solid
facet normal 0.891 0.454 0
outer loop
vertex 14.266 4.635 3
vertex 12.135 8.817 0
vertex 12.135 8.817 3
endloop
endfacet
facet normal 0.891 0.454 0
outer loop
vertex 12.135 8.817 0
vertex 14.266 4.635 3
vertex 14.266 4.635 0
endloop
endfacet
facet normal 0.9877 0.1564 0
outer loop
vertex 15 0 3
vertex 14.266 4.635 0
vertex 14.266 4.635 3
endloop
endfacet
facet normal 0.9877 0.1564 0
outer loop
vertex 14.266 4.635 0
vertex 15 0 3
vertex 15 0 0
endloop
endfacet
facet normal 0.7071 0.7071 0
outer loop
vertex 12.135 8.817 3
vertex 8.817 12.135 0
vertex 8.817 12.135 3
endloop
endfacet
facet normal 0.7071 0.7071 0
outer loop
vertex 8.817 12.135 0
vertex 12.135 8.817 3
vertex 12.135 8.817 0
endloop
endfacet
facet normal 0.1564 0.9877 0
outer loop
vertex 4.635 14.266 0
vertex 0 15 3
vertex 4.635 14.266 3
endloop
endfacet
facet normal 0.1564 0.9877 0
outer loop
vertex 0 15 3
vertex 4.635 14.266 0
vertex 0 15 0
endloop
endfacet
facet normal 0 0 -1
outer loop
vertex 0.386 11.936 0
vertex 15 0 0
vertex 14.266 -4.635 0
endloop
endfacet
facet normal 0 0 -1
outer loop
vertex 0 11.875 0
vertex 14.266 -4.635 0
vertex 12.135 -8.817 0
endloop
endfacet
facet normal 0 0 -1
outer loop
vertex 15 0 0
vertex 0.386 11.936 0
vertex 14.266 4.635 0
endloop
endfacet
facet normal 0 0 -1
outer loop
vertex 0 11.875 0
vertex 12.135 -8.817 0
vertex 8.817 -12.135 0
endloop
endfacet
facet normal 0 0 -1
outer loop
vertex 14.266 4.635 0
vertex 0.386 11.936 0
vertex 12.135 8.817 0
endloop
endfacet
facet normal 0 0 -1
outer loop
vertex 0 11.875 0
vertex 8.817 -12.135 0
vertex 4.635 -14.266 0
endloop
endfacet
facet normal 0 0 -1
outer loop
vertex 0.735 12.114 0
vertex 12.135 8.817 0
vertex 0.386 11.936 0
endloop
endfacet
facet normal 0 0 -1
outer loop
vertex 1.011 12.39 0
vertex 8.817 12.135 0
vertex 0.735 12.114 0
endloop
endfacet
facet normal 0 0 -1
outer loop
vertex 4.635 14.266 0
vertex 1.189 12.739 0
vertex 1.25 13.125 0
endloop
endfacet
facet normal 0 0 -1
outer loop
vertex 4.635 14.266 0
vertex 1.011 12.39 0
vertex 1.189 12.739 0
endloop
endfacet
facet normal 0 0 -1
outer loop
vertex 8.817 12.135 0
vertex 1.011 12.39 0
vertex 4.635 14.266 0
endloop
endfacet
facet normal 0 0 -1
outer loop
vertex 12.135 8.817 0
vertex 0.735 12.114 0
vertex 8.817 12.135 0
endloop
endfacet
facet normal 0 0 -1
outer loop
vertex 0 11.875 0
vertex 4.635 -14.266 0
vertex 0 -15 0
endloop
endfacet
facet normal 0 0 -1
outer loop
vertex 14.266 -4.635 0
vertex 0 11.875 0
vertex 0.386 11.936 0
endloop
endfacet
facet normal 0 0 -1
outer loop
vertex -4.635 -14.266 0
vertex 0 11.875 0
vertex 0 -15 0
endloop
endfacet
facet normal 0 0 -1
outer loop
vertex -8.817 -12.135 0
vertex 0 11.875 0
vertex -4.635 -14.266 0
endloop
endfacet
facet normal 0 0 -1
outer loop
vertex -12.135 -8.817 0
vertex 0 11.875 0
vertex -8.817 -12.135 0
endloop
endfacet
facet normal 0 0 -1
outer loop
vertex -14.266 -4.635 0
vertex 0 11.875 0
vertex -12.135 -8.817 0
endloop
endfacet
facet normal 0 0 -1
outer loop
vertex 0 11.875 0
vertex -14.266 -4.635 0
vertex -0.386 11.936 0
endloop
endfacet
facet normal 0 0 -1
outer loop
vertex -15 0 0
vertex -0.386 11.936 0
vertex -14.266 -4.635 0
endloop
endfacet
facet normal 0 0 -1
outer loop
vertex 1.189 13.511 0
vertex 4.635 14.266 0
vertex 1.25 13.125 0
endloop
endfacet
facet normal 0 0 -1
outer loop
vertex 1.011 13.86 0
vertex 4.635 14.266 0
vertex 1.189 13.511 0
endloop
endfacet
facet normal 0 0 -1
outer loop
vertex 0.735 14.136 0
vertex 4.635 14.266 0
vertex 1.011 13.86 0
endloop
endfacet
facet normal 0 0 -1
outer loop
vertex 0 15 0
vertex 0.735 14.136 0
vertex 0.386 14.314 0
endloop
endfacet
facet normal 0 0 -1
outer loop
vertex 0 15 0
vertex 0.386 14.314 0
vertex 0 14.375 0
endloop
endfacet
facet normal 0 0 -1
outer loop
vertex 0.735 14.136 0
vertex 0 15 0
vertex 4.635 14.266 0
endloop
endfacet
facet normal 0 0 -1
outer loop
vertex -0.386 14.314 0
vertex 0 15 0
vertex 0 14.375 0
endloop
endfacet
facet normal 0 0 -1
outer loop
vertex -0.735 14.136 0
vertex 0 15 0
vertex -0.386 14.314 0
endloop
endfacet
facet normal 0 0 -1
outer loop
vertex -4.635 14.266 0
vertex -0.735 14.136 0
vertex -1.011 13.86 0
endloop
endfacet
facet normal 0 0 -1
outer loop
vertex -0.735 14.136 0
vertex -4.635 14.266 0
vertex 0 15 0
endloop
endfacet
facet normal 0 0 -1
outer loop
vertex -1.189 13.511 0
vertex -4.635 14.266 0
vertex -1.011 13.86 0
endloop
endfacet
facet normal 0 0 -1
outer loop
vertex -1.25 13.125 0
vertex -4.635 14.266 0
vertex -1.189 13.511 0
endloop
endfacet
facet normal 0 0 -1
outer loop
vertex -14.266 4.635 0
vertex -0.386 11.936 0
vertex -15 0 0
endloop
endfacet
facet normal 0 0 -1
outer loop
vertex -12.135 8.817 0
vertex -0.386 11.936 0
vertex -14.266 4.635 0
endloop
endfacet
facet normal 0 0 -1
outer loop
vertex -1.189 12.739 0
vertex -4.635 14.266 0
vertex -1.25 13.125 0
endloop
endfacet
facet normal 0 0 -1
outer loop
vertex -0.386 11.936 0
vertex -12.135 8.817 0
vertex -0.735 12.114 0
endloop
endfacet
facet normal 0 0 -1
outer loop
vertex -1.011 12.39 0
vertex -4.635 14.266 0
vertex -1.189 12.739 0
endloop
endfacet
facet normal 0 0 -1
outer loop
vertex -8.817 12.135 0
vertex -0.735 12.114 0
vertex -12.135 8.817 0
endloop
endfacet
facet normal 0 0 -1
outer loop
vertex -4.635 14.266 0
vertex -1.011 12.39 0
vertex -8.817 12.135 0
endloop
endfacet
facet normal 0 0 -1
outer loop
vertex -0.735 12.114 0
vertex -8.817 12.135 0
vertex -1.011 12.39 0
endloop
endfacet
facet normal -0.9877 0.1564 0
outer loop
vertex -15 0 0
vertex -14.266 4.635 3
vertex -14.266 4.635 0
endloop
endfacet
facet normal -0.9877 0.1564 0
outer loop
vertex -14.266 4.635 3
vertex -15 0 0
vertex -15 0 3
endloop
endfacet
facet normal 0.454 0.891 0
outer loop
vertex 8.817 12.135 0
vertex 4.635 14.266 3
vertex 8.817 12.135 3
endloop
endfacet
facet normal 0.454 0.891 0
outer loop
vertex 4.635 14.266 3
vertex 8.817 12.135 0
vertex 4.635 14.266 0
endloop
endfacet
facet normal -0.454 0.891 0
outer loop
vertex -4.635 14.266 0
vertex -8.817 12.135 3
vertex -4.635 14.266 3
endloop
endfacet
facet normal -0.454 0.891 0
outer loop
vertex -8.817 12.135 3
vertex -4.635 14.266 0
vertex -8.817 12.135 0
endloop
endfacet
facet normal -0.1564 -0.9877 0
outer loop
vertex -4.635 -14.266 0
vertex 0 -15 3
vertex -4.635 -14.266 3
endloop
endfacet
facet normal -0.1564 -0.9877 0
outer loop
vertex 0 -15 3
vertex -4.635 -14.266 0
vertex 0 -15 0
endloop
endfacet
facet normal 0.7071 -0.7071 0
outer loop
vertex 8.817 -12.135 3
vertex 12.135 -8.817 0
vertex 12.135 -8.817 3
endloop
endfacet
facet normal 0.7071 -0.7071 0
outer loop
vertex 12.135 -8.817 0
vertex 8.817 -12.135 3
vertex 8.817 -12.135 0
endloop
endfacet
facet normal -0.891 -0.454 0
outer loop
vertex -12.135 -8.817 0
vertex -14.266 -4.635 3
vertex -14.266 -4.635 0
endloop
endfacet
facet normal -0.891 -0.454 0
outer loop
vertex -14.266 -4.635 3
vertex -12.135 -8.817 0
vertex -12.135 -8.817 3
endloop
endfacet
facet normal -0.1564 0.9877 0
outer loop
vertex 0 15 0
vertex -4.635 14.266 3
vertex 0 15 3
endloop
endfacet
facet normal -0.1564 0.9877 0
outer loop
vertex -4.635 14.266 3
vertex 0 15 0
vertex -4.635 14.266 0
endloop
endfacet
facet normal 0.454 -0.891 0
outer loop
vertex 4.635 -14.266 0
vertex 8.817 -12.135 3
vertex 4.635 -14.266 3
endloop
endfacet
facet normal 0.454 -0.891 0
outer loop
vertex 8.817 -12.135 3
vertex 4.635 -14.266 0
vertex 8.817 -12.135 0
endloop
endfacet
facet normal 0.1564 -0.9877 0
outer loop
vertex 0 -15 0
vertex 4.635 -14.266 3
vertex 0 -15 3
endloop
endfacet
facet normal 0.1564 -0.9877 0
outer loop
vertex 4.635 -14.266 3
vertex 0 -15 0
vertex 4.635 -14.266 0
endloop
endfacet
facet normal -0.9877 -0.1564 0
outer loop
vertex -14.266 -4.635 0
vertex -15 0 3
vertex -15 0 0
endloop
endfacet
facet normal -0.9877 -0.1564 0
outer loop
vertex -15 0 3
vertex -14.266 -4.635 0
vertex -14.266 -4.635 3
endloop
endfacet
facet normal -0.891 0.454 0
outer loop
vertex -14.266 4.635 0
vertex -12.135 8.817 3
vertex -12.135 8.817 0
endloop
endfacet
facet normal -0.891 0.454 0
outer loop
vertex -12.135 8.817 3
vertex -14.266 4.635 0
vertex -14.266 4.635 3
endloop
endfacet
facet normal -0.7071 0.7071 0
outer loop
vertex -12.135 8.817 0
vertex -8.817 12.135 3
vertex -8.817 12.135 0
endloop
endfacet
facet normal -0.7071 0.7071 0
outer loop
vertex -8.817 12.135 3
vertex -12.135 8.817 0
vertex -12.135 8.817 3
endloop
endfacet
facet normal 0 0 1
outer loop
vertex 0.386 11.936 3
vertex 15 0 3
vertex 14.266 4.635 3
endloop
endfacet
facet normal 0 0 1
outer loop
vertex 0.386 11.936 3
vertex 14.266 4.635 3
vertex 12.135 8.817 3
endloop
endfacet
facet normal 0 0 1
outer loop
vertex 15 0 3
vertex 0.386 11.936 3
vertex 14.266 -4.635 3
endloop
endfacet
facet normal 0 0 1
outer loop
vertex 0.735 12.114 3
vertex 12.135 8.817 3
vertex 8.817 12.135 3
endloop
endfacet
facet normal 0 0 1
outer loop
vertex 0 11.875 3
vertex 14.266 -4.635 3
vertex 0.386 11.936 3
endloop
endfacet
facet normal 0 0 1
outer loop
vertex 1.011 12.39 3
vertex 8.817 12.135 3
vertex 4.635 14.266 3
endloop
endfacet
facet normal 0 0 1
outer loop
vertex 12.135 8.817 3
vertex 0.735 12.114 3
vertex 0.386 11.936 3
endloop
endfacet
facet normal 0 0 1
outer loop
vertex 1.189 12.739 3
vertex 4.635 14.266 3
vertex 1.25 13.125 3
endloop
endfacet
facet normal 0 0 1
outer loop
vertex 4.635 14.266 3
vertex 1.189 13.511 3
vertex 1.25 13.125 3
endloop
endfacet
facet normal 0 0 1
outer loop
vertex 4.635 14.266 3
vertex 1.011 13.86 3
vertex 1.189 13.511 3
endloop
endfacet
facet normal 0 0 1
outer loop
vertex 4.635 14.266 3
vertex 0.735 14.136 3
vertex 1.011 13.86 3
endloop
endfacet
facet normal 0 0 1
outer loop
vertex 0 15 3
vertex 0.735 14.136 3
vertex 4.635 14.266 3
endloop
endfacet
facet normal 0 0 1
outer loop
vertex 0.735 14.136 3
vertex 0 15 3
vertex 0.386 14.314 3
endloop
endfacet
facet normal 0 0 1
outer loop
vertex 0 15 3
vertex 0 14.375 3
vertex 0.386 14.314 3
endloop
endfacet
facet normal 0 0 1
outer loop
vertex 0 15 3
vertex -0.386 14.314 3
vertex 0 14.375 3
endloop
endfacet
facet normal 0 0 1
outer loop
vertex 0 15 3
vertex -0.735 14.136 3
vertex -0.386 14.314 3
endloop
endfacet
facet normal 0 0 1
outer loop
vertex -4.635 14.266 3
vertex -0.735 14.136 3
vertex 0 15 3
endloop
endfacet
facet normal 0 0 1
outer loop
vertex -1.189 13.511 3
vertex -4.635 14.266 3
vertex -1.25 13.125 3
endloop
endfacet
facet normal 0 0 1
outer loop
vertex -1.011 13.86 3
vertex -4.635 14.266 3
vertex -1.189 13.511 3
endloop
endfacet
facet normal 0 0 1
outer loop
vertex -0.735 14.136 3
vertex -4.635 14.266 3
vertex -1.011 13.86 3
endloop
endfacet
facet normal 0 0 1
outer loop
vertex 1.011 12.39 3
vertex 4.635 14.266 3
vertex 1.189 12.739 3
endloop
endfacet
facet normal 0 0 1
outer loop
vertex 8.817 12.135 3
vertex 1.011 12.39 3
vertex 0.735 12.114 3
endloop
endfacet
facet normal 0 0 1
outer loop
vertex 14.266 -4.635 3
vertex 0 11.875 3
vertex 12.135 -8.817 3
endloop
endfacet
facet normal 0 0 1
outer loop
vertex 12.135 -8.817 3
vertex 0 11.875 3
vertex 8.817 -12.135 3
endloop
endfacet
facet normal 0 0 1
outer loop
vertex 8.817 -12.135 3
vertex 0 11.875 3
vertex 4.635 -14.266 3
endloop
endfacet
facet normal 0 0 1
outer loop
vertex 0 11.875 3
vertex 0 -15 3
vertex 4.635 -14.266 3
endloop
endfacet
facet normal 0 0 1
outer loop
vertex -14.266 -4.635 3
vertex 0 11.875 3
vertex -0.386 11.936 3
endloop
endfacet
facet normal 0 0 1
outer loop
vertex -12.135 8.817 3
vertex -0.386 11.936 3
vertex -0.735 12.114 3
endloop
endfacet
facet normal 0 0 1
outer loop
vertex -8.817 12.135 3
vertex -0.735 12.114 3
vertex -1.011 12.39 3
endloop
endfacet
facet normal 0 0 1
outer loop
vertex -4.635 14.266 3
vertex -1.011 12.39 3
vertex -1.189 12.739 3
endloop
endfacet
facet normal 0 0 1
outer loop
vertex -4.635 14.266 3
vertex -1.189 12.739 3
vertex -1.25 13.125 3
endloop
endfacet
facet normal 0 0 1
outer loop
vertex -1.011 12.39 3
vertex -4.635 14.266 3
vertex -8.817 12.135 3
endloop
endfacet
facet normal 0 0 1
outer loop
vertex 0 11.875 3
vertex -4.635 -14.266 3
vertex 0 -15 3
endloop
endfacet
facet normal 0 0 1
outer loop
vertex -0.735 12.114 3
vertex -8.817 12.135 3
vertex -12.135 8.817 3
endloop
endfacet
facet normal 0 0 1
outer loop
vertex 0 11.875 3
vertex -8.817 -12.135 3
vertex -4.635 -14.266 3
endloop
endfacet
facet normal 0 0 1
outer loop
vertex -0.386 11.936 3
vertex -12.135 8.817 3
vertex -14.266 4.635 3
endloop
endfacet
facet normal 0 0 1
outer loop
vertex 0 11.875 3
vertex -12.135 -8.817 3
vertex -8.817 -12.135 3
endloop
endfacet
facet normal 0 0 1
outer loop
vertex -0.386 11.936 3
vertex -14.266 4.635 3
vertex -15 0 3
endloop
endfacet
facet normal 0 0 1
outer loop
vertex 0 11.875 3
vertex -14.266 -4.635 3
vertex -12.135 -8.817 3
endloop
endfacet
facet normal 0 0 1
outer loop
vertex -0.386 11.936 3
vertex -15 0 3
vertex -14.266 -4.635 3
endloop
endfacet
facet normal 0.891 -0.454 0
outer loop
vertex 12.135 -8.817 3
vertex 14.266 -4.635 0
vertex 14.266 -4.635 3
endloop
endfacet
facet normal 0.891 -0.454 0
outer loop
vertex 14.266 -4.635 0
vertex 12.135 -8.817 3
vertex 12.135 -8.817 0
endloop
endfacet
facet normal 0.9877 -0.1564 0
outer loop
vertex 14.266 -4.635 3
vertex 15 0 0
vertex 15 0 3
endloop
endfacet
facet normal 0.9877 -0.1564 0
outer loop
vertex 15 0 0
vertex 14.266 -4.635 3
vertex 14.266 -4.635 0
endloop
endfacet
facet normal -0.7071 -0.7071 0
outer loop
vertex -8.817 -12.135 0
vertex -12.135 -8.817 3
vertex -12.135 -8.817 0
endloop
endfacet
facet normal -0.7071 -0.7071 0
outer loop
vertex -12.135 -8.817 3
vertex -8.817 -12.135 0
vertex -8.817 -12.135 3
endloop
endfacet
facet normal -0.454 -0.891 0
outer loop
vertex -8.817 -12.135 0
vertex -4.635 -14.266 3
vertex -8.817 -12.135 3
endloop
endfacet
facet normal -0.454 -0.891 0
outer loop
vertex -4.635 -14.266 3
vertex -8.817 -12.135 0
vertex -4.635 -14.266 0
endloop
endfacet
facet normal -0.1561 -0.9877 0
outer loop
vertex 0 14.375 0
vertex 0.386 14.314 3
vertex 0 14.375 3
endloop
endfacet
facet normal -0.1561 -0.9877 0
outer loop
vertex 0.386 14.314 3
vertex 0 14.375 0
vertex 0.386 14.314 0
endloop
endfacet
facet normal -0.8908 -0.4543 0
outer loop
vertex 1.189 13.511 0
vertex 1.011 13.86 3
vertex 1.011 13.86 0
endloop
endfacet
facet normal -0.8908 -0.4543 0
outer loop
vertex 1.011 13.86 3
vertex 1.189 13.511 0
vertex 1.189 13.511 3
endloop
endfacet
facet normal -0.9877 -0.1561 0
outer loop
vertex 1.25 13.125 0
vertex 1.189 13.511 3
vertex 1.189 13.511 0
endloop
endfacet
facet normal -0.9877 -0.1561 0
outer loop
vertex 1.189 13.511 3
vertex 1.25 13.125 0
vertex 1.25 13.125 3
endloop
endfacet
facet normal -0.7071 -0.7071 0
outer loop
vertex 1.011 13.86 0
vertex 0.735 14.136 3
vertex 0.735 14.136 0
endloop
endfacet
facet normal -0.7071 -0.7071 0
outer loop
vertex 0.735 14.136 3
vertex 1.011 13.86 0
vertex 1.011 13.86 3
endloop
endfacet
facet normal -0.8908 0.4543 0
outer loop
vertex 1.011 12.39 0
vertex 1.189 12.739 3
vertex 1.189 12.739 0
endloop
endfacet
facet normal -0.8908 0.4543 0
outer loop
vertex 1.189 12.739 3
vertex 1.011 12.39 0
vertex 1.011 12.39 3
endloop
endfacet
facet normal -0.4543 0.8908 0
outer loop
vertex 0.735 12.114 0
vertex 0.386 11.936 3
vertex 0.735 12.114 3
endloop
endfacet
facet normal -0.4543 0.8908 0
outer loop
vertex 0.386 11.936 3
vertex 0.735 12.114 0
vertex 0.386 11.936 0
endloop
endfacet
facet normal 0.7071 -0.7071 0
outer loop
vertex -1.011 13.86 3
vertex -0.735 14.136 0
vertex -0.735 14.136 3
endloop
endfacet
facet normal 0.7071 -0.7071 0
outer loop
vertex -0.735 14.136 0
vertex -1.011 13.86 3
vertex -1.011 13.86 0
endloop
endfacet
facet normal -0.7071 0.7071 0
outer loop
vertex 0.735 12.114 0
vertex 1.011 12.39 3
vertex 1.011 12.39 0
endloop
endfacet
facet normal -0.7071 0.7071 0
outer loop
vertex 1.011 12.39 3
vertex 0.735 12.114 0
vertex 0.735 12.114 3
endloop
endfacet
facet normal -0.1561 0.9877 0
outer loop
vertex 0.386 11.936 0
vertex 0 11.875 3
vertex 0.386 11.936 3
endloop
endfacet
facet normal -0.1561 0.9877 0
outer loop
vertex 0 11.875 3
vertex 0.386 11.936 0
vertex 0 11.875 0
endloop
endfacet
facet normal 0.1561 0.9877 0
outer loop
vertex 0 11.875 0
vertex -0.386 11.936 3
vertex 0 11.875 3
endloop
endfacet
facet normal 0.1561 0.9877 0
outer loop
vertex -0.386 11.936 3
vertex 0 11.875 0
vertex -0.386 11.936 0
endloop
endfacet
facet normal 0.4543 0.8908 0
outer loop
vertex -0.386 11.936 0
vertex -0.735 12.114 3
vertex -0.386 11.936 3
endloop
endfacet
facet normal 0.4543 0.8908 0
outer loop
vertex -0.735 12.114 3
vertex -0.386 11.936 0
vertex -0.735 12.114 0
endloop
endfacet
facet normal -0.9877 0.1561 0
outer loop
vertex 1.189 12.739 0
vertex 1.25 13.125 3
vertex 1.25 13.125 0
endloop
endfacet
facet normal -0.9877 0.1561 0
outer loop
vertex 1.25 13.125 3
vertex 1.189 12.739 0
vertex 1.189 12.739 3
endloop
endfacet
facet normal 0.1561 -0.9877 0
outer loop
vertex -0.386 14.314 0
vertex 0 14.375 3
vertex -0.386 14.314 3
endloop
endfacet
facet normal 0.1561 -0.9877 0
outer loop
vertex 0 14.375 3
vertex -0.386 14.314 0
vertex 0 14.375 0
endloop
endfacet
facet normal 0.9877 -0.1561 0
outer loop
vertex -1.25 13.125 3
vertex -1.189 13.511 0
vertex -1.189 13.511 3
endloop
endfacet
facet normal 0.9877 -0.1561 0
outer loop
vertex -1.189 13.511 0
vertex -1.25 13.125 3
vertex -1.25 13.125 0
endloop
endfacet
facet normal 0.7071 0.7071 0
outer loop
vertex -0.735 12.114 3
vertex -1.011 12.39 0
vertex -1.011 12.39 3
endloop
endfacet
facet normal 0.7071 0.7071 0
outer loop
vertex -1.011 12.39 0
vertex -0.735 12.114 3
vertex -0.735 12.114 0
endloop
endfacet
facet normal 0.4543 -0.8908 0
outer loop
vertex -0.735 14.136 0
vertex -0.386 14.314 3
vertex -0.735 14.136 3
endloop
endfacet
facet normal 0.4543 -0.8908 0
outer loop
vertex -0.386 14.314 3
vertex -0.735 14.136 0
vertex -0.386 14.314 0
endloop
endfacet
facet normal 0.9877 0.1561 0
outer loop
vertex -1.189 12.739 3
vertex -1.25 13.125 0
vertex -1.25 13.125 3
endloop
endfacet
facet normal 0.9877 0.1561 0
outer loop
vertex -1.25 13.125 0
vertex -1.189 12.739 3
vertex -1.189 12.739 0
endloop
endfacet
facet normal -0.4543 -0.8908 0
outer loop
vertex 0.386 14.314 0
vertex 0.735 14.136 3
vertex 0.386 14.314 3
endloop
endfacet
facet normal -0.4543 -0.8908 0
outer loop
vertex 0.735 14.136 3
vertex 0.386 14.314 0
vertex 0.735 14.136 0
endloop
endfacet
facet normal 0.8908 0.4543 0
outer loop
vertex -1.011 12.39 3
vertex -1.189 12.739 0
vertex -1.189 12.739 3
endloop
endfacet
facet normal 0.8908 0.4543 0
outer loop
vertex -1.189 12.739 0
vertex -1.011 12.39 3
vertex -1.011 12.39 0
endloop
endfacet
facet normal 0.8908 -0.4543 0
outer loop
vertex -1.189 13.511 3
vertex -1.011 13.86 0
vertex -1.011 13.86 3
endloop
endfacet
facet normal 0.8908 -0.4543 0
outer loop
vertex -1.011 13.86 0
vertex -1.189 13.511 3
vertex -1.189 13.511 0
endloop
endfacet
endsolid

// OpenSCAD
// coin dimensions
roundness=20;
coinHeight=3;
coinRadius=15;

// coin image
coinImage="SafeCoin.png";
imageSize=coinRadius*1.5;
imageHeight=coinHeight*1.5;

// pendant option
isPendant=true;

difference(){
    difference(){
        cylinder(h=coinHeight, r=coinRadius, center=false, $fn=roundness);
        resize([imageSize,imageSize,imageHeight])
            surface(file=coinImage, center=true, invert=false);
    }
    if(isPendant){
        translate([0,coinRadius*.875,0])
            cylinder(h=coinHeight, r=1.25, center=false, $fn=20);
    }
}
